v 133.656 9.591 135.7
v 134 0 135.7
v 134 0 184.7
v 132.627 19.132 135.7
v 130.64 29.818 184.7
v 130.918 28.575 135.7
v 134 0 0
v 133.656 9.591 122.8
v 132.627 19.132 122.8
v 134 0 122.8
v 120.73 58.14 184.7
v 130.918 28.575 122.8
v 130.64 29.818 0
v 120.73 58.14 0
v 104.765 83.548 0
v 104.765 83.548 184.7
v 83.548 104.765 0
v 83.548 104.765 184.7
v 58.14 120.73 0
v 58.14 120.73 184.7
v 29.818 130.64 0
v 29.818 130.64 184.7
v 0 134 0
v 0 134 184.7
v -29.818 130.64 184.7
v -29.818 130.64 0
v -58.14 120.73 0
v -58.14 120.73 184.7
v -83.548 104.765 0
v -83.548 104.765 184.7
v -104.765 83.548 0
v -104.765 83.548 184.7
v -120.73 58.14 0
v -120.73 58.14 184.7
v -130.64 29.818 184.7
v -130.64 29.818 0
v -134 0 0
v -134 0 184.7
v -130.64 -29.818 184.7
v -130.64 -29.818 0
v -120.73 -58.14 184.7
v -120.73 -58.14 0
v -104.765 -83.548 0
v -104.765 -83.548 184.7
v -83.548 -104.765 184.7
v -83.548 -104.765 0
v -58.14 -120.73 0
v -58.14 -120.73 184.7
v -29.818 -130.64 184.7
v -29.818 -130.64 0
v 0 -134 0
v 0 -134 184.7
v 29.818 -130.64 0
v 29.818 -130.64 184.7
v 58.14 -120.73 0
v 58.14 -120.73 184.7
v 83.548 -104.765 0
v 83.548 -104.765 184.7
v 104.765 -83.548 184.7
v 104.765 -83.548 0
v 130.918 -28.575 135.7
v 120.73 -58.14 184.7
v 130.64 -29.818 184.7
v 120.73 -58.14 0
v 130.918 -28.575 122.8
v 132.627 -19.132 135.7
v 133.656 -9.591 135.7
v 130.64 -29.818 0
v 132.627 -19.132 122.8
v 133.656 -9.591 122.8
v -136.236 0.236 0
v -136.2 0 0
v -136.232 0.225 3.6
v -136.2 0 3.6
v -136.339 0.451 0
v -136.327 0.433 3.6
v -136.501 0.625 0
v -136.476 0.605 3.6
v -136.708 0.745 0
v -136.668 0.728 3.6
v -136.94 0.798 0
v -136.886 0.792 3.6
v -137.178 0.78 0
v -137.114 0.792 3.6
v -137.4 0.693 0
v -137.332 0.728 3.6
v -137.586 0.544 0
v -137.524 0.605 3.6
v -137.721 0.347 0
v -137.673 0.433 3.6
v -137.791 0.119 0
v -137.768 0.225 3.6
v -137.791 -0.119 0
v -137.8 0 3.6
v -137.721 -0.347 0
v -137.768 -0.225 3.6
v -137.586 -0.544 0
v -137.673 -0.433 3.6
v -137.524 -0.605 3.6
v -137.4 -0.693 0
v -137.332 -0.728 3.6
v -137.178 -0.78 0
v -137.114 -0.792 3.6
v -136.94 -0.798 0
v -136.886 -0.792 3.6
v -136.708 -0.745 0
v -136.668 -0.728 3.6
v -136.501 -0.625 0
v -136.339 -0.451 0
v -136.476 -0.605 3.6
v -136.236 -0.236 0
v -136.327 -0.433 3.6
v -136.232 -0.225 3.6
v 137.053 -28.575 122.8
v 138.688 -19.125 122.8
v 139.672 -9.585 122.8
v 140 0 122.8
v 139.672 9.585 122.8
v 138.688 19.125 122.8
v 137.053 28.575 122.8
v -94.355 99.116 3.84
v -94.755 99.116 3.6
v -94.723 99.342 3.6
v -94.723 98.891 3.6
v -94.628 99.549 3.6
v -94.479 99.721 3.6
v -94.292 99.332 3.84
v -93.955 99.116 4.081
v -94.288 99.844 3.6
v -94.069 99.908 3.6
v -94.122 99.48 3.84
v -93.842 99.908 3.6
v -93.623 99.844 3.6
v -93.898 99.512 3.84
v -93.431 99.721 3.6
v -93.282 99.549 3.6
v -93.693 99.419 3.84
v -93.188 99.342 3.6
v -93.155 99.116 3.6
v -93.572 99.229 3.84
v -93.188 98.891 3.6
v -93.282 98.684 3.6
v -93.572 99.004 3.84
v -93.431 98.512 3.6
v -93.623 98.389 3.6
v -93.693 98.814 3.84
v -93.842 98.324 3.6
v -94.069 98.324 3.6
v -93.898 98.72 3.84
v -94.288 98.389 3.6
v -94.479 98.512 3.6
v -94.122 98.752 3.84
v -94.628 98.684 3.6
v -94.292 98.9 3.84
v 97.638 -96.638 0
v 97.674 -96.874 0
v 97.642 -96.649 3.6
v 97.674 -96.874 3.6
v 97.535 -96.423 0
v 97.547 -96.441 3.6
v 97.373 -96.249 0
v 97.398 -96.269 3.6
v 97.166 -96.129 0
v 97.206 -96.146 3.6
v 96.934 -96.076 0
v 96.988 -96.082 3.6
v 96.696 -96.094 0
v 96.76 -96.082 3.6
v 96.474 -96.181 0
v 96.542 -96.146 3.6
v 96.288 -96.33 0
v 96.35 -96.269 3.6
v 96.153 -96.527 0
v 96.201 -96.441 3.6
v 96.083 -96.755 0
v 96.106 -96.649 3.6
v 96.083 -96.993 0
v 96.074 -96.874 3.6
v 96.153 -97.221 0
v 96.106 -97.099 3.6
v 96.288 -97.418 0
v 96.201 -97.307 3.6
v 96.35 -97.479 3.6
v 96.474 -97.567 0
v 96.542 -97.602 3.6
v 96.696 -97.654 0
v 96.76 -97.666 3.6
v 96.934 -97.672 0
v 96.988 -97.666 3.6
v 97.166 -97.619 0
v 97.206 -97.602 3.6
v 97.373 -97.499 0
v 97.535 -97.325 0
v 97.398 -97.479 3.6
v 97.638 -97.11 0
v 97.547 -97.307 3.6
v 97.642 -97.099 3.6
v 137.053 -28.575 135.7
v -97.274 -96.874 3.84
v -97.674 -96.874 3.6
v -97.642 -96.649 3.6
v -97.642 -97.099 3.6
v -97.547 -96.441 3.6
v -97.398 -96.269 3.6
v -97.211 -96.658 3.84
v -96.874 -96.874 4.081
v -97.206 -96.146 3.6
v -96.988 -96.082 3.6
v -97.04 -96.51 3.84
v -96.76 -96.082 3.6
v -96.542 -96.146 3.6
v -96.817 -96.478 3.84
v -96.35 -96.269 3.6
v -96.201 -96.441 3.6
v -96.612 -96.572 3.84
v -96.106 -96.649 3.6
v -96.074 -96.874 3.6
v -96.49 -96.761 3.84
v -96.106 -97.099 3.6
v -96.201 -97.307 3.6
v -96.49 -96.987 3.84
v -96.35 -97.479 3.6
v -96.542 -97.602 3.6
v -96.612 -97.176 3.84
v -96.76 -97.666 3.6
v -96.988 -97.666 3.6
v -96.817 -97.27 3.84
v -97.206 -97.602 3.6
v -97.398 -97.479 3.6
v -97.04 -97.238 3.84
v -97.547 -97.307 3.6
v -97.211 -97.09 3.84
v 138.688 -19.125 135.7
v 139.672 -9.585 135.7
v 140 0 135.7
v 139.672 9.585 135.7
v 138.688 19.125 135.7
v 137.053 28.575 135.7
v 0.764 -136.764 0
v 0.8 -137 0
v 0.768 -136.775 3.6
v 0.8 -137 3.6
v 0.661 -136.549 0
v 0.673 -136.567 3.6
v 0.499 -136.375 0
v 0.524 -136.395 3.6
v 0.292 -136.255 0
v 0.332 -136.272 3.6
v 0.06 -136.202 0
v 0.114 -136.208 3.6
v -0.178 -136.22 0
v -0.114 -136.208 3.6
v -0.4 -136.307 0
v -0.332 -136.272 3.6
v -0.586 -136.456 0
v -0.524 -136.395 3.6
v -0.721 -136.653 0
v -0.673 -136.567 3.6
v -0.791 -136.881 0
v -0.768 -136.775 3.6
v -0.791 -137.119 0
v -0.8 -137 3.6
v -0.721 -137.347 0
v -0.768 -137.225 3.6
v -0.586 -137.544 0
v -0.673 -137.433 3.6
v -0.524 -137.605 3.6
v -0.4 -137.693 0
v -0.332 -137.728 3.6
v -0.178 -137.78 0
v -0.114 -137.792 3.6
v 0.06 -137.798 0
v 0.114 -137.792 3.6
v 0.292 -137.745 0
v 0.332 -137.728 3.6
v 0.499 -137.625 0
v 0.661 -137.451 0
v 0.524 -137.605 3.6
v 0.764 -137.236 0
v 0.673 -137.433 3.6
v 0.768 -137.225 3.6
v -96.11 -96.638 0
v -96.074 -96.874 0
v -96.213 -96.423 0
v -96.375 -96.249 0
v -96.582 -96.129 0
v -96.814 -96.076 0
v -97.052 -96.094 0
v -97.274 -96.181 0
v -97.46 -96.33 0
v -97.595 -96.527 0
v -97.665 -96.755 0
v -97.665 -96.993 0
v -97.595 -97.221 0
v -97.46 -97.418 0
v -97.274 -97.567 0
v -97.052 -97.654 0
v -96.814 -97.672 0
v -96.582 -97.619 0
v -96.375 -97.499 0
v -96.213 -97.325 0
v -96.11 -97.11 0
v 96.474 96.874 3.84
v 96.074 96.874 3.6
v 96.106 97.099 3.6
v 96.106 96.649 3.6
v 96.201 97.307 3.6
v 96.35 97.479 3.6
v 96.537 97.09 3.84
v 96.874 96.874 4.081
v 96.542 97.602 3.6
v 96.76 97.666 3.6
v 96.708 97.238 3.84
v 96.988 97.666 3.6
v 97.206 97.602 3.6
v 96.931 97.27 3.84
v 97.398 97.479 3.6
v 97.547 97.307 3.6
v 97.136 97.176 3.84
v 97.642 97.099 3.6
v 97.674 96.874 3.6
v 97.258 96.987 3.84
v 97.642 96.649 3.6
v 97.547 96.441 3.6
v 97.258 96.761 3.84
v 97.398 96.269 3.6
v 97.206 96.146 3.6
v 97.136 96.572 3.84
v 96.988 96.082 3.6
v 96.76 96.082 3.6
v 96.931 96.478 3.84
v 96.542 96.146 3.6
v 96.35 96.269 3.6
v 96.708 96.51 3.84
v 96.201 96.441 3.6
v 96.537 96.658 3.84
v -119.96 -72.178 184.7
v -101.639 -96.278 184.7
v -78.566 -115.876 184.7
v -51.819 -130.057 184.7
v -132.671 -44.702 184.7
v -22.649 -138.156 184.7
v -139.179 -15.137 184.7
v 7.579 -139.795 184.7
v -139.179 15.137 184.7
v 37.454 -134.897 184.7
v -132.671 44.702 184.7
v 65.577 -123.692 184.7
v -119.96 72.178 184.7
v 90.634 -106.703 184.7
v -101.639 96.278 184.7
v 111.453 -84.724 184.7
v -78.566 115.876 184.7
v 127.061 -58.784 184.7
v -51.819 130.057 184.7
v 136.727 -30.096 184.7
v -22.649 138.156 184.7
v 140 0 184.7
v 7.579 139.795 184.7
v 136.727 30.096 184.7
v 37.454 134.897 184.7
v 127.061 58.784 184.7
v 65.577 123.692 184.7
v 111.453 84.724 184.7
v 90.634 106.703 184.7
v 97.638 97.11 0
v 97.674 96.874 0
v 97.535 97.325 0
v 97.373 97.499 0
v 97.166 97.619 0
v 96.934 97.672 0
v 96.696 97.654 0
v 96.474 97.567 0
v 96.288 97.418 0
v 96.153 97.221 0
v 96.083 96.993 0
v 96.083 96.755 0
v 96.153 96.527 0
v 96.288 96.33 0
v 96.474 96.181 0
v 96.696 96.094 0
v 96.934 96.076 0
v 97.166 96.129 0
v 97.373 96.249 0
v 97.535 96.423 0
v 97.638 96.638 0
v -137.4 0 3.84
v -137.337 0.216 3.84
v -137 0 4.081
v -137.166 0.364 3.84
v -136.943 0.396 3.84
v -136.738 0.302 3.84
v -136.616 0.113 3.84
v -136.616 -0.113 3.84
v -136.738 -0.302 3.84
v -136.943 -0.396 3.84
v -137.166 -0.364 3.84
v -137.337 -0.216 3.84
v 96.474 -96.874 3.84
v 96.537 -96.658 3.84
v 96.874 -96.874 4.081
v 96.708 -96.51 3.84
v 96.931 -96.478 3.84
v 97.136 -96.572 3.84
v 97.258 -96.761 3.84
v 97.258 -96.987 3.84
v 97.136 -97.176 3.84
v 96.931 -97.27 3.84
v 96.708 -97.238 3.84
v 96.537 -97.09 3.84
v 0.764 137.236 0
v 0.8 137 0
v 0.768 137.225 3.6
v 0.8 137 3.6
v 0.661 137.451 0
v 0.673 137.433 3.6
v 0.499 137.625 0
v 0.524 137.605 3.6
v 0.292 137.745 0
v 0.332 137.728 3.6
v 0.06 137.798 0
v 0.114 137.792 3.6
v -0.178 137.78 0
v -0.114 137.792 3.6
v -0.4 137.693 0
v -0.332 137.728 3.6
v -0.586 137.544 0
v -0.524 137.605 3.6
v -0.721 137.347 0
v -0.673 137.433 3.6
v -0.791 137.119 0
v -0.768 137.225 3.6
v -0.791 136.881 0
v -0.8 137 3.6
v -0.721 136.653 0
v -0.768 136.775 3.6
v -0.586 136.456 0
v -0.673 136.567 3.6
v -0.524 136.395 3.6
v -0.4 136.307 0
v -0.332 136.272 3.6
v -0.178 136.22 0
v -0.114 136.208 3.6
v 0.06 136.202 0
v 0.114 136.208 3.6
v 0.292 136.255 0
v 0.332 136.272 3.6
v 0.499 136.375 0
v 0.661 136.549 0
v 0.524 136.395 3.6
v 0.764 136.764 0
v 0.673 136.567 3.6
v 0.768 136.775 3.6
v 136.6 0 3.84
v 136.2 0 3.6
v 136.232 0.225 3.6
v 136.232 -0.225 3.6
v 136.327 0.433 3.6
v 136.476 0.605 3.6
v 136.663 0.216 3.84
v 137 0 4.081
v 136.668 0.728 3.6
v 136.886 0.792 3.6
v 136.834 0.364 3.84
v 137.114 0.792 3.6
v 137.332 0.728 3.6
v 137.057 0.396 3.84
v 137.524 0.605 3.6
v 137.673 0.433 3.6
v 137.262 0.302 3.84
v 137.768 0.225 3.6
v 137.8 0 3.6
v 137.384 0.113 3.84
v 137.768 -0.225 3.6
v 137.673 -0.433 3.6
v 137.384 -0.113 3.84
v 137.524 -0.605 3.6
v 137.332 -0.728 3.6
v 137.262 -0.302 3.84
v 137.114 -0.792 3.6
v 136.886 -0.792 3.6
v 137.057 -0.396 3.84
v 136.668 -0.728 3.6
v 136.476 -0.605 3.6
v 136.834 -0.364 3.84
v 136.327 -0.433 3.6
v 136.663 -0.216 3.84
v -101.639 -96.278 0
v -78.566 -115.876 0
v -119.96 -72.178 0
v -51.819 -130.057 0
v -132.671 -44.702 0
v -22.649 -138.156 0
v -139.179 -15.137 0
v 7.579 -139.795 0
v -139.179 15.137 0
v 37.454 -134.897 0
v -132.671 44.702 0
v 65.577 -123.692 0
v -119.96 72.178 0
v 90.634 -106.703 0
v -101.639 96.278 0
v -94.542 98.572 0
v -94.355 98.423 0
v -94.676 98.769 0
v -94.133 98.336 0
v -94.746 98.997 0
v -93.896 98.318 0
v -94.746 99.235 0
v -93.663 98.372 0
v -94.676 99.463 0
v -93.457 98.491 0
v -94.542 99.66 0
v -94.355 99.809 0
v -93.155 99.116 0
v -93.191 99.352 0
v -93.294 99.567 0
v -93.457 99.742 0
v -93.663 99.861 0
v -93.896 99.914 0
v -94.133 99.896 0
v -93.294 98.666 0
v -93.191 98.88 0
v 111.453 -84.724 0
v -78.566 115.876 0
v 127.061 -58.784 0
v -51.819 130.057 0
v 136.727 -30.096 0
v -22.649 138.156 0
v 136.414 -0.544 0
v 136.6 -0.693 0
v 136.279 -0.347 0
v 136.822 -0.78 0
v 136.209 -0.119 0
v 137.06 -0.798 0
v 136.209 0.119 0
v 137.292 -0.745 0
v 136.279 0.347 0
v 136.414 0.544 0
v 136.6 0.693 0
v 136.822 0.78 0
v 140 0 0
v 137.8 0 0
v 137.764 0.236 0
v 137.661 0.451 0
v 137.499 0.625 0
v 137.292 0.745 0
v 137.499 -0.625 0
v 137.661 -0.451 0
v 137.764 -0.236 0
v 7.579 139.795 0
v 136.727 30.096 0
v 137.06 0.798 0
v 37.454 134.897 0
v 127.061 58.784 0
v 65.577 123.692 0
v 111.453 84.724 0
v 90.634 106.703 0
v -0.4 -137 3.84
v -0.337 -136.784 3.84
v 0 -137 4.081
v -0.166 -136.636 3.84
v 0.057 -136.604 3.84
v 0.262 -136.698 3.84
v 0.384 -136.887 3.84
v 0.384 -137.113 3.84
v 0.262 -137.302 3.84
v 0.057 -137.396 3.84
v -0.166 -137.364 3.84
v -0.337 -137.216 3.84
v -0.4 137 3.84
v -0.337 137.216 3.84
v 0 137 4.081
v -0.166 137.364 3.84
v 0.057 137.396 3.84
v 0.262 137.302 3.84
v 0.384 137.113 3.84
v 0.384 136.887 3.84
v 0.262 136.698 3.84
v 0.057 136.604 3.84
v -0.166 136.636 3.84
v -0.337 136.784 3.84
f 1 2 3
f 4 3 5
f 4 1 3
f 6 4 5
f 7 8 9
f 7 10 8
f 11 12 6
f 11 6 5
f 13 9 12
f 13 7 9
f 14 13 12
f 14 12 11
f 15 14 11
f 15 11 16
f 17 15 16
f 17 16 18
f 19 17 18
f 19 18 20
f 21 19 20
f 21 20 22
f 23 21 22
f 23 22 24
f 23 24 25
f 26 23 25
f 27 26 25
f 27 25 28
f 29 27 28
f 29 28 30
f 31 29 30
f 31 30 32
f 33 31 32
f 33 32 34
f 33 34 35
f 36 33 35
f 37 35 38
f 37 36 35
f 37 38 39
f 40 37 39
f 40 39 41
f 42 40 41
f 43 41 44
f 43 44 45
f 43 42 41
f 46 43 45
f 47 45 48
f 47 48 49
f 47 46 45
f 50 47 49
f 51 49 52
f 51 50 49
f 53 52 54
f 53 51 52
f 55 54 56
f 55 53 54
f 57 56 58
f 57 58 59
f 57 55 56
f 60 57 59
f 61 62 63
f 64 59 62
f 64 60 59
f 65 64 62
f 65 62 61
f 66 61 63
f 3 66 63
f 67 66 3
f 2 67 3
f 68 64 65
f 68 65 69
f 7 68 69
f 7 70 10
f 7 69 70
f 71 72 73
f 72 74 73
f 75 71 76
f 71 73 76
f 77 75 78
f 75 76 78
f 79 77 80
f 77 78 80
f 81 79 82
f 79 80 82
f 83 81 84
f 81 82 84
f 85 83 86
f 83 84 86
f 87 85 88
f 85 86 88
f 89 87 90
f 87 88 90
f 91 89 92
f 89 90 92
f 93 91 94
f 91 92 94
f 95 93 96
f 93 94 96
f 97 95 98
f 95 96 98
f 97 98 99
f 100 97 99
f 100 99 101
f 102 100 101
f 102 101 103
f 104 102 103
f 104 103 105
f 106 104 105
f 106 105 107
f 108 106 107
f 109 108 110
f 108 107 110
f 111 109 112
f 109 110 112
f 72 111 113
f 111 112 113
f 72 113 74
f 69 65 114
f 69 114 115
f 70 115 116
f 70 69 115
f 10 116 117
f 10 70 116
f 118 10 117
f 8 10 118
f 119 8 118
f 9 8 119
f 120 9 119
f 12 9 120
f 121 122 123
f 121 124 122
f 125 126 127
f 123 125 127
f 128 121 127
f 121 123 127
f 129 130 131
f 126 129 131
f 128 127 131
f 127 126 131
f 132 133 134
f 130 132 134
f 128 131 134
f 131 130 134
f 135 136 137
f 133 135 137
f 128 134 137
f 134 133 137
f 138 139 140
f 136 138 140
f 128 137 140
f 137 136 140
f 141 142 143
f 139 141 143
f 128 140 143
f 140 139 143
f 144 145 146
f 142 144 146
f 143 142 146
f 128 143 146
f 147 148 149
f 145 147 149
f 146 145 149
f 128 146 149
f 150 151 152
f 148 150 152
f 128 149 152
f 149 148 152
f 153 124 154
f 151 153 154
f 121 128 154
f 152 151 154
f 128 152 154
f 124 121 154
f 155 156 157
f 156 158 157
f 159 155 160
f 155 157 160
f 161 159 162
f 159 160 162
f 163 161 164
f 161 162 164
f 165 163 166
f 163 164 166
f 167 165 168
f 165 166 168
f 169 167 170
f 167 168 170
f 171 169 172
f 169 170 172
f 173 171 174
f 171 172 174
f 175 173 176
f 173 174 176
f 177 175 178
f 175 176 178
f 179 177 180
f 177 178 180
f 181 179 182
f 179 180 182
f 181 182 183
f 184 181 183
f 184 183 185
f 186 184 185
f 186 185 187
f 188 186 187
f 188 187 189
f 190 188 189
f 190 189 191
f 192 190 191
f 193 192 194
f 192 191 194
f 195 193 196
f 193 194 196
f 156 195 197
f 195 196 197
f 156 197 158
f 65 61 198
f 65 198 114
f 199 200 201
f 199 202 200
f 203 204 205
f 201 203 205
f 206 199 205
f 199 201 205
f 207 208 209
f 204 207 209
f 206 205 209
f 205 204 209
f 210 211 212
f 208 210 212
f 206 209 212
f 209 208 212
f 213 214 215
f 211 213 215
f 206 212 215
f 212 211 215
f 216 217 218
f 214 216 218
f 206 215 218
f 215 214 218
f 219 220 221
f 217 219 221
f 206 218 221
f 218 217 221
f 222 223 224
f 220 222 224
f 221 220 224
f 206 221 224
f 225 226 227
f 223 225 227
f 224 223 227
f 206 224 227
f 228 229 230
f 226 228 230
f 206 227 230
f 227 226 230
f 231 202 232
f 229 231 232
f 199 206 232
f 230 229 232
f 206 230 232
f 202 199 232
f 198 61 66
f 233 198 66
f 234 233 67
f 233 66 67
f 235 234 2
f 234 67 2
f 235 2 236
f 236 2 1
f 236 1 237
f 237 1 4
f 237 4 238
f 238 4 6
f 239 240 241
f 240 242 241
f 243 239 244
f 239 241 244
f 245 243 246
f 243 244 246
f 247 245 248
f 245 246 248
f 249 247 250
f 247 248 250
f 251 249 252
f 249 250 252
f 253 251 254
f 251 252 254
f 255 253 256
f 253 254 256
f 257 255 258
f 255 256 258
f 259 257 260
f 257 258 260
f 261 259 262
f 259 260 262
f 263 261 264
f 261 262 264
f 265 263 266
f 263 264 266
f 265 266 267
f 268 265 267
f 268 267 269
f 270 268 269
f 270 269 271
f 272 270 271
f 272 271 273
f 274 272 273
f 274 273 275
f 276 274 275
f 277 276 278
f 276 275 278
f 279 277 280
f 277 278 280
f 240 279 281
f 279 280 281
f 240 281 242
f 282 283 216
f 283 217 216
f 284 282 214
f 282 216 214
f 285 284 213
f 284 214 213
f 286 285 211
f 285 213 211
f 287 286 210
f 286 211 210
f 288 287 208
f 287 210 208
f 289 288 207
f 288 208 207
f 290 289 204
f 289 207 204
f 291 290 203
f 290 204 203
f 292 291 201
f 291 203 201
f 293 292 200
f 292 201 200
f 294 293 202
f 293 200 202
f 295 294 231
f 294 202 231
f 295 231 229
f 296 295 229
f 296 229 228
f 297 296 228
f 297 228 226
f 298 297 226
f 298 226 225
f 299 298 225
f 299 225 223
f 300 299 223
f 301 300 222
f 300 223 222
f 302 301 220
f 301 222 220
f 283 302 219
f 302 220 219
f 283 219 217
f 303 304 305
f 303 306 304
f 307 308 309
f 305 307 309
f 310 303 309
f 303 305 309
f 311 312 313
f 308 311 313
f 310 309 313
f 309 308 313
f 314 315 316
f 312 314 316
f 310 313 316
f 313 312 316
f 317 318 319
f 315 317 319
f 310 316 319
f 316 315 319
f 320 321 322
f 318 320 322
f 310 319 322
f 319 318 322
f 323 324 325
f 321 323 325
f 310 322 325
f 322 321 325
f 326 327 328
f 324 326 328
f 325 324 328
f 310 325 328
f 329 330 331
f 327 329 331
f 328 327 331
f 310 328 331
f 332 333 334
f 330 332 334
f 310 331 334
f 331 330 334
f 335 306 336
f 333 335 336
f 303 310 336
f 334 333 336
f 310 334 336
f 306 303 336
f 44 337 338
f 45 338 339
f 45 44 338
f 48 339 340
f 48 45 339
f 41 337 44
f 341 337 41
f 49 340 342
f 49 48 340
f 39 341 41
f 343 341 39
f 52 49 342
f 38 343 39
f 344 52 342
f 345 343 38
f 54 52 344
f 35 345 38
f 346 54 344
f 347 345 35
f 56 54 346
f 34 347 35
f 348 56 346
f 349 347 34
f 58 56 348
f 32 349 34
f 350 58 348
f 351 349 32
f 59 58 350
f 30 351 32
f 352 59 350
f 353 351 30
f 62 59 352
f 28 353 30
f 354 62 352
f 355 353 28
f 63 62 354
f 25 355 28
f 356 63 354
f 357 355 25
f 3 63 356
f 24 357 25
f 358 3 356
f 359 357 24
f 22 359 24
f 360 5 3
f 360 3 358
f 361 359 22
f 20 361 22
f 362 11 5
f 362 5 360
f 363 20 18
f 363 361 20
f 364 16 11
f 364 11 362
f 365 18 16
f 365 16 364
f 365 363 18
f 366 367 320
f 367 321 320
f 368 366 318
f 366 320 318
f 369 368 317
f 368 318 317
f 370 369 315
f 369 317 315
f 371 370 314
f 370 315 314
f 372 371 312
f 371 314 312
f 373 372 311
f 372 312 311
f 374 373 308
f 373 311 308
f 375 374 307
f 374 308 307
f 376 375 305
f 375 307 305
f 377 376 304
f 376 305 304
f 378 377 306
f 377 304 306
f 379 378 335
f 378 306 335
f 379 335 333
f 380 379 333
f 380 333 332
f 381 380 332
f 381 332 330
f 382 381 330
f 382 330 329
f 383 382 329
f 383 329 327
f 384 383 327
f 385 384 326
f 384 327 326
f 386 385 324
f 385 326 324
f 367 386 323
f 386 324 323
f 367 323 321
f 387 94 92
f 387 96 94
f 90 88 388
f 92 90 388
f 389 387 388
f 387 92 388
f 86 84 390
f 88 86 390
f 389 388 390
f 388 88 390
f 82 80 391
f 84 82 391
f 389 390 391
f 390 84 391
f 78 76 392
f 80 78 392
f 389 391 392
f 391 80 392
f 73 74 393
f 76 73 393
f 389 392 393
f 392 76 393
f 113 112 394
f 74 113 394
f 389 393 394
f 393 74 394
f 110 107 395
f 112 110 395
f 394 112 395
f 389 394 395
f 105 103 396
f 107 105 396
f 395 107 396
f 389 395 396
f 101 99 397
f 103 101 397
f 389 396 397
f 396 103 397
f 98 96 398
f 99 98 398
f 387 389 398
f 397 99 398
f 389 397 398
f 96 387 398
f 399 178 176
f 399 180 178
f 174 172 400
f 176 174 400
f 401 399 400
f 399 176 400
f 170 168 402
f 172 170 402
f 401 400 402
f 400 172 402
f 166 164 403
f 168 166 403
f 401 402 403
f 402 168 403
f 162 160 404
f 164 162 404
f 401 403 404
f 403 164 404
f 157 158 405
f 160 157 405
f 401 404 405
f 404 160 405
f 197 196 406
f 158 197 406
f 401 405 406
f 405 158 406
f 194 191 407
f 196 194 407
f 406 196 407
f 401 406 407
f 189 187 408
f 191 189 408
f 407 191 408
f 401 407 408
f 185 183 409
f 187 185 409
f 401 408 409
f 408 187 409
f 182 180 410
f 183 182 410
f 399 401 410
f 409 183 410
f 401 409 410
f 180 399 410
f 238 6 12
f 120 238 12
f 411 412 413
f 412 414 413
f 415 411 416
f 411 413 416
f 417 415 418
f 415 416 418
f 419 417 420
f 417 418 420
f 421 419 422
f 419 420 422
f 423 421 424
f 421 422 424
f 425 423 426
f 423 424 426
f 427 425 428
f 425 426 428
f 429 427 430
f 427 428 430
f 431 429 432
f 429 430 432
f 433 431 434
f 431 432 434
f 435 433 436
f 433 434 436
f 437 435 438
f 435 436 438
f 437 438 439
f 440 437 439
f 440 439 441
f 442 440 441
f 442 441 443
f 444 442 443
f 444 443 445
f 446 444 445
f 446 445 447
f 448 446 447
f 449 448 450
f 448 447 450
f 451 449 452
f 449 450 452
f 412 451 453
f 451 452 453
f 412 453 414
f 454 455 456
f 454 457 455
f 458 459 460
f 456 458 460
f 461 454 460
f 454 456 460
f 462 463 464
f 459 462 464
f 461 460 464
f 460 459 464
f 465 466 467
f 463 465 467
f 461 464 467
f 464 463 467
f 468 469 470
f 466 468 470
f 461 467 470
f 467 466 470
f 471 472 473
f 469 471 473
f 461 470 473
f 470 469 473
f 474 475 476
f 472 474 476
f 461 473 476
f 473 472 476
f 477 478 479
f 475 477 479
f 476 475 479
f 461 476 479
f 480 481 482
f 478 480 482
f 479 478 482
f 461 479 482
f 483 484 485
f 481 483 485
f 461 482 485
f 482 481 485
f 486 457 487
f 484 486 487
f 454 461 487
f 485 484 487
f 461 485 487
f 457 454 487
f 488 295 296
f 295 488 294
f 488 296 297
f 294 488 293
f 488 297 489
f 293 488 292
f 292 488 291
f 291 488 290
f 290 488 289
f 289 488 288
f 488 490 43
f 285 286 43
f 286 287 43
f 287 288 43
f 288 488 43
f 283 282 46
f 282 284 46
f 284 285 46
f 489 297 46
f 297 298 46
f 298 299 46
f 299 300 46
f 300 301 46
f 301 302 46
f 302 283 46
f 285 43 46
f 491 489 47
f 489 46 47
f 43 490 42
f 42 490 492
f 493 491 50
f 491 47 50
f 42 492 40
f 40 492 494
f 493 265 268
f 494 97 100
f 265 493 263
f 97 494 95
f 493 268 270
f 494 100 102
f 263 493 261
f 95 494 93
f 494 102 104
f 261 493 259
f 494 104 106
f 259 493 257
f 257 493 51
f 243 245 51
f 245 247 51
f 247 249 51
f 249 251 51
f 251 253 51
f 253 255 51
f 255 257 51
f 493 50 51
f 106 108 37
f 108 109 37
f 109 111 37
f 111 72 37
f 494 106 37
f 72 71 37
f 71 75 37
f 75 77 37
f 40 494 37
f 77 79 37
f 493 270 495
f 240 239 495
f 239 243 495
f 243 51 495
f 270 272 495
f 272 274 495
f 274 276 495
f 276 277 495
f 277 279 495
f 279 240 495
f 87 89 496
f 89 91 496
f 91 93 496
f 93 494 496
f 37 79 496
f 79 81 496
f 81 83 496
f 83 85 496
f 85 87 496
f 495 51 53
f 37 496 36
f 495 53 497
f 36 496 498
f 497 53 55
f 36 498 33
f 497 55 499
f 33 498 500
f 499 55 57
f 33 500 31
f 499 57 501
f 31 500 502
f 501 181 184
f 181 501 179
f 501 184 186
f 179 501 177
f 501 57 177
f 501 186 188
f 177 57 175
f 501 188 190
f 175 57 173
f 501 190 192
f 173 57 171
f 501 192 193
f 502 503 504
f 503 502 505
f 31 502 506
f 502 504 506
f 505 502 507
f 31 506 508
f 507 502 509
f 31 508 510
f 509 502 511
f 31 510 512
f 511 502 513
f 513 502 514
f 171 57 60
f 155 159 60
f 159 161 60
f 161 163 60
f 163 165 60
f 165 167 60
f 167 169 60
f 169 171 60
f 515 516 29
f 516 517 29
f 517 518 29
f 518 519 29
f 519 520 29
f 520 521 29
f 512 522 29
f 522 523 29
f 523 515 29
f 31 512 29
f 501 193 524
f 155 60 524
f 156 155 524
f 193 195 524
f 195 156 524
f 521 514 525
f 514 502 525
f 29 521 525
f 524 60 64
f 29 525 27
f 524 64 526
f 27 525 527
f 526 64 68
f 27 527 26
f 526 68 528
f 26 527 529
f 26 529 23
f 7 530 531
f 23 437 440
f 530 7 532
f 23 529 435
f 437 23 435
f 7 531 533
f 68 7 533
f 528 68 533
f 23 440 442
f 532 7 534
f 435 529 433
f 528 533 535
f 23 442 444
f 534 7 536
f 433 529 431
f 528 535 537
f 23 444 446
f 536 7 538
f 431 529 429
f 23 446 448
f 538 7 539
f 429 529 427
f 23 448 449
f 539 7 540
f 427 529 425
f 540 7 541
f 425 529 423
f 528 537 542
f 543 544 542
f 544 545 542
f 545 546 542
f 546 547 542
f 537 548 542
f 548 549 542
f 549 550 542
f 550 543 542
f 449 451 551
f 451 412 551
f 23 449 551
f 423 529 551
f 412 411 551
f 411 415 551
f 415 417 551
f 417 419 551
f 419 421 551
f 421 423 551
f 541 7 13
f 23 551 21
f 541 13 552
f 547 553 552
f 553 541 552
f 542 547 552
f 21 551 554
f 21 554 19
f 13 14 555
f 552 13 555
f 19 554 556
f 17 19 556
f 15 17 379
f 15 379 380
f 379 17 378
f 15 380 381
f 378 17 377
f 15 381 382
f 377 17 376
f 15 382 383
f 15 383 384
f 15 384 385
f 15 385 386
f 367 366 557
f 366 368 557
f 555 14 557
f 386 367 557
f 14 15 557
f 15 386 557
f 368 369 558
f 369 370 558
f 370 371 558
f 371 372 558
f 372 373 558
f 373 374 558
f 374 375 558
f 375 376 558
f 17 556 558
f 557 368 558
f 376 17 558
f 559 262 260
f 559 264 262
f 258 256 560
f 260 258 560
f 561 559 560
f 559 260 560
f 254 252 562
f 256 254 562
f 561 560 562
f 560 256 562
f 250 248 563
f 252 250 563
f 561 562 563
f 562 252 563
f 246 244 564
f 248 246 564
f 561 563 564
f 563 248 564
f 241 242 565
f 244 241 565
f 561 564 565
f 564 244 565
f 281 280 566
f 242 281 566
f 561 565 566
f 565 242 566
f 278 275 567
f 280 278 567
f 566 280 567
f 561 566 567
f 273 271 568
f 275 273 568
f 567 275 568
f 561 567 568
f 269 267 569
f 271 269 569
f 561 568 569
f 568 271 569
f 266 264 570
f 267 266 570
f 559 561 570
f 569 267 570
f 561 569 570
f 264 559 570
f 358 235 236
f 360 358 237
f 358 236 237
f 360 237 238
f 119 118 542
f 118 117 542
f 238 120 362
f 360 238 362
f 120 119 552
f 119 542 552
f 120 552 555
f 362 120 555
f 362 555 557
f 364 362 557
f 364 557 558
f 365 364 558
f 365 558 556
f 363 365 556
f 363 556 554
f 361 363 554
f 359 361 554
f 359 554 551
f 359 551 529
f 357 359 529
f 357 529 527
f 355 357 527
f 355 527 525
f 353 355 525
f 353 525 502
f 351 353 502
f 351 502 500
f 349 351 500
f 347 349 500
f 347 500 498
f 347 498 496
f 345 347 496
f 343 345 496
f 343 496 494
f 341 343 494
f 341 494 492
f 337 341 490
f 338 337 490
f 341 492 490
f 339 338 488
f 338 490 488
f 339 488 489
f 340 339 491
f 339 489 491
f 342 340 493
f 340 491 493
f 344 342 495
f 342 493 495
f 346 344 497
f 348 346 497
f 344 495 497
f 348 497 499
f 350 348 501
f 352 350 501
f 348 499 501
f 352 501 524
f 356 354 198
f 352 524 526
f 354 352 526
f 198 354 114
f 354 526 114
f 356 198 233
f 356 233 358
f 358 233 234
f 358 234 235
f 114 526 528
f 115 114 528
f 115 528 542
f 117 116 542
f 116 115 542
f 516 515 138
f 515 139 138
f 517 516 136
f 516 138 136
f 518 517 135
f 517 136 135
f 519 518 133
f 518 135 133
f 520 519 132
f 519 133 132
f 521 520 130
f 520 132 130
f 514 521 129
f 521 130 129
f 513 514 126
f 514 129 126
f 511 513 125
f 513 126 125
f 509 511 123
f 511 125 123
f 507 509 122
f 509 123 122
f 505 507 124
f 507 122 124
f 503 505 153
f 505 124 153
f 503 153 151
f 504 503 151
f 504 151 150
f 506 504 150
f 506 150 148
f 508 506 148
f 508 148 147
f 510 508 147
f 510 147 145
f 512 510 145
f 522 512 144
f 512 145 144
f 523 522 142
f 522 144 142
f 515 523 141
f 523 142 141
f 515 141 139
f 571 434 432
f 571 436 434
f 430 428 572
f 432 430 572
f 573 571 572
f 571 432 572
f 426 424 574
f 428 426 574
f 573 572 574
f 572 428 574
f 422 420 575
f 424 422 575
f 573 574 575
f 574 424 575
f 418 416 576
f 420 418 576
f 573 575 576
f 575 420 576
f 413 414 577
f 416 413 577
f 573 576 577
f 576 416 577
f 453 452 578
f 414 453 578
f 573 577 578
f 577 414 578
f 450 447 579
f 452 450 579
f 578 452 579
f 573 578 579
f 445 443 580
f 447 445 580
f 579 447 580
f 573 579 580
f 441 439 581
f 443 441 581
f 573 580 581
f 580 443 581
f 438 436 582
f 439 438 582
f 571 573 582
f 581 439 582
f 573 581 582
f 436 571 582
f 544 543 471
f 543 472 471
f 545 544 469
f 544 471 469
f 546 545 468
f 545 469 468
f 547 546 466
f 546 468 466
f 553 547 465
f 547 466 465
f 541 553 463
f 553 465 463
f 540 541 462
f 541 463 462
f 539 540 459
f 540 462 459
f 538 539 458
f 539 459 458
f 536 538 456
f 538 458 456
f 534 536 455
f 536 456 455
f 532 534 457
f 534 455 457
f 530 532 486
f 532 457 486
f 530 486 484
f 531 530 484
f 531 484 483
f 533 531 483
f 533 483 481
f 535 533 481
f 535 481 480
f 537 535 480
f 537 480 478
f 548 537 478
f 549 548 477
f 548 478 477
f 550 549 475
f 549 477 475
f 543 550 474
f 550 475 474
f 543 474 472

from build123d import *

# Parameters (mm, degrees)
SKETCH1_R                 = 140
SKETCH1_R_2               = 134
BOSS_EXTRUDE1_DEPTH       = 184.7
M2X0_4_TAPPED_HOLE2_D     = 1.6
M2X0_4_TAPPED_HOLE2_DEPTH = 3.6
M2X0_4_TAPPED_HOLE2_TIP   = 0.480688495
SKETCH5_W                 = 12.9
SKETCH5_H                 = 57.15
CUT_EXTRUDE1_DEPTH        = 140


with BuildPart() as part:
    # Sketch1 → Boss-Extrude1 (new body)
    with BuildSketch(Plane.XY):
        Circle(SKETCH1_R)
        Circle(SKETCH1_R_2, mode=Mode.SUBTRACT)
    extrude(amount=BOSS_EXTRUDE1_DEPTH)

    # M2x0.4 Tapped Hole2
    with Locations(Plane(origin=(0, 0, 0), x_dir=(-1, 0, 0), z_dir=(0, 0, -1))):
        with Locations((0, 137), (137, 0), (93.955376533, 99.116205732), (96.874, -96.874), (0, -137), (-96.874, -96.874), (-137, 0), (-96.874, 96.874)):
            Hole(M2X0_4_TAPPED_HOLE2_D / 2, depth=M2X0_4_TAPPED_HOLE2_DEPTH)
            with Locations((0, 0, -(M2X0_4_TAPPED_HOLE2_DEPTH + M2X0_4_TAPPED_HOLE2_TIP / 2))):  # 118° drill point
                Cone(0, M2X0_4_TAPPED_HOLE2_D / 2, M2X0_4_TAPPED_HOLE2_TIP, mode=Mode.SUBTRACT)

    # Sketch5 → Cut-Extrude1 (cut)
    with BuildSketch(Plane(origin=(0, 0, 0), x_dir=(0, 0, -1), z_dir=(1, 0, 0))):
        with Locations((-129.25, 0)):
            Rectangle(SKETCH5_W, SKETCH5_H)
    extrude(amount=CUT_EXTRUDE1_DEPTH, mode=Mode.SUBTRACT)


solid = part.part
